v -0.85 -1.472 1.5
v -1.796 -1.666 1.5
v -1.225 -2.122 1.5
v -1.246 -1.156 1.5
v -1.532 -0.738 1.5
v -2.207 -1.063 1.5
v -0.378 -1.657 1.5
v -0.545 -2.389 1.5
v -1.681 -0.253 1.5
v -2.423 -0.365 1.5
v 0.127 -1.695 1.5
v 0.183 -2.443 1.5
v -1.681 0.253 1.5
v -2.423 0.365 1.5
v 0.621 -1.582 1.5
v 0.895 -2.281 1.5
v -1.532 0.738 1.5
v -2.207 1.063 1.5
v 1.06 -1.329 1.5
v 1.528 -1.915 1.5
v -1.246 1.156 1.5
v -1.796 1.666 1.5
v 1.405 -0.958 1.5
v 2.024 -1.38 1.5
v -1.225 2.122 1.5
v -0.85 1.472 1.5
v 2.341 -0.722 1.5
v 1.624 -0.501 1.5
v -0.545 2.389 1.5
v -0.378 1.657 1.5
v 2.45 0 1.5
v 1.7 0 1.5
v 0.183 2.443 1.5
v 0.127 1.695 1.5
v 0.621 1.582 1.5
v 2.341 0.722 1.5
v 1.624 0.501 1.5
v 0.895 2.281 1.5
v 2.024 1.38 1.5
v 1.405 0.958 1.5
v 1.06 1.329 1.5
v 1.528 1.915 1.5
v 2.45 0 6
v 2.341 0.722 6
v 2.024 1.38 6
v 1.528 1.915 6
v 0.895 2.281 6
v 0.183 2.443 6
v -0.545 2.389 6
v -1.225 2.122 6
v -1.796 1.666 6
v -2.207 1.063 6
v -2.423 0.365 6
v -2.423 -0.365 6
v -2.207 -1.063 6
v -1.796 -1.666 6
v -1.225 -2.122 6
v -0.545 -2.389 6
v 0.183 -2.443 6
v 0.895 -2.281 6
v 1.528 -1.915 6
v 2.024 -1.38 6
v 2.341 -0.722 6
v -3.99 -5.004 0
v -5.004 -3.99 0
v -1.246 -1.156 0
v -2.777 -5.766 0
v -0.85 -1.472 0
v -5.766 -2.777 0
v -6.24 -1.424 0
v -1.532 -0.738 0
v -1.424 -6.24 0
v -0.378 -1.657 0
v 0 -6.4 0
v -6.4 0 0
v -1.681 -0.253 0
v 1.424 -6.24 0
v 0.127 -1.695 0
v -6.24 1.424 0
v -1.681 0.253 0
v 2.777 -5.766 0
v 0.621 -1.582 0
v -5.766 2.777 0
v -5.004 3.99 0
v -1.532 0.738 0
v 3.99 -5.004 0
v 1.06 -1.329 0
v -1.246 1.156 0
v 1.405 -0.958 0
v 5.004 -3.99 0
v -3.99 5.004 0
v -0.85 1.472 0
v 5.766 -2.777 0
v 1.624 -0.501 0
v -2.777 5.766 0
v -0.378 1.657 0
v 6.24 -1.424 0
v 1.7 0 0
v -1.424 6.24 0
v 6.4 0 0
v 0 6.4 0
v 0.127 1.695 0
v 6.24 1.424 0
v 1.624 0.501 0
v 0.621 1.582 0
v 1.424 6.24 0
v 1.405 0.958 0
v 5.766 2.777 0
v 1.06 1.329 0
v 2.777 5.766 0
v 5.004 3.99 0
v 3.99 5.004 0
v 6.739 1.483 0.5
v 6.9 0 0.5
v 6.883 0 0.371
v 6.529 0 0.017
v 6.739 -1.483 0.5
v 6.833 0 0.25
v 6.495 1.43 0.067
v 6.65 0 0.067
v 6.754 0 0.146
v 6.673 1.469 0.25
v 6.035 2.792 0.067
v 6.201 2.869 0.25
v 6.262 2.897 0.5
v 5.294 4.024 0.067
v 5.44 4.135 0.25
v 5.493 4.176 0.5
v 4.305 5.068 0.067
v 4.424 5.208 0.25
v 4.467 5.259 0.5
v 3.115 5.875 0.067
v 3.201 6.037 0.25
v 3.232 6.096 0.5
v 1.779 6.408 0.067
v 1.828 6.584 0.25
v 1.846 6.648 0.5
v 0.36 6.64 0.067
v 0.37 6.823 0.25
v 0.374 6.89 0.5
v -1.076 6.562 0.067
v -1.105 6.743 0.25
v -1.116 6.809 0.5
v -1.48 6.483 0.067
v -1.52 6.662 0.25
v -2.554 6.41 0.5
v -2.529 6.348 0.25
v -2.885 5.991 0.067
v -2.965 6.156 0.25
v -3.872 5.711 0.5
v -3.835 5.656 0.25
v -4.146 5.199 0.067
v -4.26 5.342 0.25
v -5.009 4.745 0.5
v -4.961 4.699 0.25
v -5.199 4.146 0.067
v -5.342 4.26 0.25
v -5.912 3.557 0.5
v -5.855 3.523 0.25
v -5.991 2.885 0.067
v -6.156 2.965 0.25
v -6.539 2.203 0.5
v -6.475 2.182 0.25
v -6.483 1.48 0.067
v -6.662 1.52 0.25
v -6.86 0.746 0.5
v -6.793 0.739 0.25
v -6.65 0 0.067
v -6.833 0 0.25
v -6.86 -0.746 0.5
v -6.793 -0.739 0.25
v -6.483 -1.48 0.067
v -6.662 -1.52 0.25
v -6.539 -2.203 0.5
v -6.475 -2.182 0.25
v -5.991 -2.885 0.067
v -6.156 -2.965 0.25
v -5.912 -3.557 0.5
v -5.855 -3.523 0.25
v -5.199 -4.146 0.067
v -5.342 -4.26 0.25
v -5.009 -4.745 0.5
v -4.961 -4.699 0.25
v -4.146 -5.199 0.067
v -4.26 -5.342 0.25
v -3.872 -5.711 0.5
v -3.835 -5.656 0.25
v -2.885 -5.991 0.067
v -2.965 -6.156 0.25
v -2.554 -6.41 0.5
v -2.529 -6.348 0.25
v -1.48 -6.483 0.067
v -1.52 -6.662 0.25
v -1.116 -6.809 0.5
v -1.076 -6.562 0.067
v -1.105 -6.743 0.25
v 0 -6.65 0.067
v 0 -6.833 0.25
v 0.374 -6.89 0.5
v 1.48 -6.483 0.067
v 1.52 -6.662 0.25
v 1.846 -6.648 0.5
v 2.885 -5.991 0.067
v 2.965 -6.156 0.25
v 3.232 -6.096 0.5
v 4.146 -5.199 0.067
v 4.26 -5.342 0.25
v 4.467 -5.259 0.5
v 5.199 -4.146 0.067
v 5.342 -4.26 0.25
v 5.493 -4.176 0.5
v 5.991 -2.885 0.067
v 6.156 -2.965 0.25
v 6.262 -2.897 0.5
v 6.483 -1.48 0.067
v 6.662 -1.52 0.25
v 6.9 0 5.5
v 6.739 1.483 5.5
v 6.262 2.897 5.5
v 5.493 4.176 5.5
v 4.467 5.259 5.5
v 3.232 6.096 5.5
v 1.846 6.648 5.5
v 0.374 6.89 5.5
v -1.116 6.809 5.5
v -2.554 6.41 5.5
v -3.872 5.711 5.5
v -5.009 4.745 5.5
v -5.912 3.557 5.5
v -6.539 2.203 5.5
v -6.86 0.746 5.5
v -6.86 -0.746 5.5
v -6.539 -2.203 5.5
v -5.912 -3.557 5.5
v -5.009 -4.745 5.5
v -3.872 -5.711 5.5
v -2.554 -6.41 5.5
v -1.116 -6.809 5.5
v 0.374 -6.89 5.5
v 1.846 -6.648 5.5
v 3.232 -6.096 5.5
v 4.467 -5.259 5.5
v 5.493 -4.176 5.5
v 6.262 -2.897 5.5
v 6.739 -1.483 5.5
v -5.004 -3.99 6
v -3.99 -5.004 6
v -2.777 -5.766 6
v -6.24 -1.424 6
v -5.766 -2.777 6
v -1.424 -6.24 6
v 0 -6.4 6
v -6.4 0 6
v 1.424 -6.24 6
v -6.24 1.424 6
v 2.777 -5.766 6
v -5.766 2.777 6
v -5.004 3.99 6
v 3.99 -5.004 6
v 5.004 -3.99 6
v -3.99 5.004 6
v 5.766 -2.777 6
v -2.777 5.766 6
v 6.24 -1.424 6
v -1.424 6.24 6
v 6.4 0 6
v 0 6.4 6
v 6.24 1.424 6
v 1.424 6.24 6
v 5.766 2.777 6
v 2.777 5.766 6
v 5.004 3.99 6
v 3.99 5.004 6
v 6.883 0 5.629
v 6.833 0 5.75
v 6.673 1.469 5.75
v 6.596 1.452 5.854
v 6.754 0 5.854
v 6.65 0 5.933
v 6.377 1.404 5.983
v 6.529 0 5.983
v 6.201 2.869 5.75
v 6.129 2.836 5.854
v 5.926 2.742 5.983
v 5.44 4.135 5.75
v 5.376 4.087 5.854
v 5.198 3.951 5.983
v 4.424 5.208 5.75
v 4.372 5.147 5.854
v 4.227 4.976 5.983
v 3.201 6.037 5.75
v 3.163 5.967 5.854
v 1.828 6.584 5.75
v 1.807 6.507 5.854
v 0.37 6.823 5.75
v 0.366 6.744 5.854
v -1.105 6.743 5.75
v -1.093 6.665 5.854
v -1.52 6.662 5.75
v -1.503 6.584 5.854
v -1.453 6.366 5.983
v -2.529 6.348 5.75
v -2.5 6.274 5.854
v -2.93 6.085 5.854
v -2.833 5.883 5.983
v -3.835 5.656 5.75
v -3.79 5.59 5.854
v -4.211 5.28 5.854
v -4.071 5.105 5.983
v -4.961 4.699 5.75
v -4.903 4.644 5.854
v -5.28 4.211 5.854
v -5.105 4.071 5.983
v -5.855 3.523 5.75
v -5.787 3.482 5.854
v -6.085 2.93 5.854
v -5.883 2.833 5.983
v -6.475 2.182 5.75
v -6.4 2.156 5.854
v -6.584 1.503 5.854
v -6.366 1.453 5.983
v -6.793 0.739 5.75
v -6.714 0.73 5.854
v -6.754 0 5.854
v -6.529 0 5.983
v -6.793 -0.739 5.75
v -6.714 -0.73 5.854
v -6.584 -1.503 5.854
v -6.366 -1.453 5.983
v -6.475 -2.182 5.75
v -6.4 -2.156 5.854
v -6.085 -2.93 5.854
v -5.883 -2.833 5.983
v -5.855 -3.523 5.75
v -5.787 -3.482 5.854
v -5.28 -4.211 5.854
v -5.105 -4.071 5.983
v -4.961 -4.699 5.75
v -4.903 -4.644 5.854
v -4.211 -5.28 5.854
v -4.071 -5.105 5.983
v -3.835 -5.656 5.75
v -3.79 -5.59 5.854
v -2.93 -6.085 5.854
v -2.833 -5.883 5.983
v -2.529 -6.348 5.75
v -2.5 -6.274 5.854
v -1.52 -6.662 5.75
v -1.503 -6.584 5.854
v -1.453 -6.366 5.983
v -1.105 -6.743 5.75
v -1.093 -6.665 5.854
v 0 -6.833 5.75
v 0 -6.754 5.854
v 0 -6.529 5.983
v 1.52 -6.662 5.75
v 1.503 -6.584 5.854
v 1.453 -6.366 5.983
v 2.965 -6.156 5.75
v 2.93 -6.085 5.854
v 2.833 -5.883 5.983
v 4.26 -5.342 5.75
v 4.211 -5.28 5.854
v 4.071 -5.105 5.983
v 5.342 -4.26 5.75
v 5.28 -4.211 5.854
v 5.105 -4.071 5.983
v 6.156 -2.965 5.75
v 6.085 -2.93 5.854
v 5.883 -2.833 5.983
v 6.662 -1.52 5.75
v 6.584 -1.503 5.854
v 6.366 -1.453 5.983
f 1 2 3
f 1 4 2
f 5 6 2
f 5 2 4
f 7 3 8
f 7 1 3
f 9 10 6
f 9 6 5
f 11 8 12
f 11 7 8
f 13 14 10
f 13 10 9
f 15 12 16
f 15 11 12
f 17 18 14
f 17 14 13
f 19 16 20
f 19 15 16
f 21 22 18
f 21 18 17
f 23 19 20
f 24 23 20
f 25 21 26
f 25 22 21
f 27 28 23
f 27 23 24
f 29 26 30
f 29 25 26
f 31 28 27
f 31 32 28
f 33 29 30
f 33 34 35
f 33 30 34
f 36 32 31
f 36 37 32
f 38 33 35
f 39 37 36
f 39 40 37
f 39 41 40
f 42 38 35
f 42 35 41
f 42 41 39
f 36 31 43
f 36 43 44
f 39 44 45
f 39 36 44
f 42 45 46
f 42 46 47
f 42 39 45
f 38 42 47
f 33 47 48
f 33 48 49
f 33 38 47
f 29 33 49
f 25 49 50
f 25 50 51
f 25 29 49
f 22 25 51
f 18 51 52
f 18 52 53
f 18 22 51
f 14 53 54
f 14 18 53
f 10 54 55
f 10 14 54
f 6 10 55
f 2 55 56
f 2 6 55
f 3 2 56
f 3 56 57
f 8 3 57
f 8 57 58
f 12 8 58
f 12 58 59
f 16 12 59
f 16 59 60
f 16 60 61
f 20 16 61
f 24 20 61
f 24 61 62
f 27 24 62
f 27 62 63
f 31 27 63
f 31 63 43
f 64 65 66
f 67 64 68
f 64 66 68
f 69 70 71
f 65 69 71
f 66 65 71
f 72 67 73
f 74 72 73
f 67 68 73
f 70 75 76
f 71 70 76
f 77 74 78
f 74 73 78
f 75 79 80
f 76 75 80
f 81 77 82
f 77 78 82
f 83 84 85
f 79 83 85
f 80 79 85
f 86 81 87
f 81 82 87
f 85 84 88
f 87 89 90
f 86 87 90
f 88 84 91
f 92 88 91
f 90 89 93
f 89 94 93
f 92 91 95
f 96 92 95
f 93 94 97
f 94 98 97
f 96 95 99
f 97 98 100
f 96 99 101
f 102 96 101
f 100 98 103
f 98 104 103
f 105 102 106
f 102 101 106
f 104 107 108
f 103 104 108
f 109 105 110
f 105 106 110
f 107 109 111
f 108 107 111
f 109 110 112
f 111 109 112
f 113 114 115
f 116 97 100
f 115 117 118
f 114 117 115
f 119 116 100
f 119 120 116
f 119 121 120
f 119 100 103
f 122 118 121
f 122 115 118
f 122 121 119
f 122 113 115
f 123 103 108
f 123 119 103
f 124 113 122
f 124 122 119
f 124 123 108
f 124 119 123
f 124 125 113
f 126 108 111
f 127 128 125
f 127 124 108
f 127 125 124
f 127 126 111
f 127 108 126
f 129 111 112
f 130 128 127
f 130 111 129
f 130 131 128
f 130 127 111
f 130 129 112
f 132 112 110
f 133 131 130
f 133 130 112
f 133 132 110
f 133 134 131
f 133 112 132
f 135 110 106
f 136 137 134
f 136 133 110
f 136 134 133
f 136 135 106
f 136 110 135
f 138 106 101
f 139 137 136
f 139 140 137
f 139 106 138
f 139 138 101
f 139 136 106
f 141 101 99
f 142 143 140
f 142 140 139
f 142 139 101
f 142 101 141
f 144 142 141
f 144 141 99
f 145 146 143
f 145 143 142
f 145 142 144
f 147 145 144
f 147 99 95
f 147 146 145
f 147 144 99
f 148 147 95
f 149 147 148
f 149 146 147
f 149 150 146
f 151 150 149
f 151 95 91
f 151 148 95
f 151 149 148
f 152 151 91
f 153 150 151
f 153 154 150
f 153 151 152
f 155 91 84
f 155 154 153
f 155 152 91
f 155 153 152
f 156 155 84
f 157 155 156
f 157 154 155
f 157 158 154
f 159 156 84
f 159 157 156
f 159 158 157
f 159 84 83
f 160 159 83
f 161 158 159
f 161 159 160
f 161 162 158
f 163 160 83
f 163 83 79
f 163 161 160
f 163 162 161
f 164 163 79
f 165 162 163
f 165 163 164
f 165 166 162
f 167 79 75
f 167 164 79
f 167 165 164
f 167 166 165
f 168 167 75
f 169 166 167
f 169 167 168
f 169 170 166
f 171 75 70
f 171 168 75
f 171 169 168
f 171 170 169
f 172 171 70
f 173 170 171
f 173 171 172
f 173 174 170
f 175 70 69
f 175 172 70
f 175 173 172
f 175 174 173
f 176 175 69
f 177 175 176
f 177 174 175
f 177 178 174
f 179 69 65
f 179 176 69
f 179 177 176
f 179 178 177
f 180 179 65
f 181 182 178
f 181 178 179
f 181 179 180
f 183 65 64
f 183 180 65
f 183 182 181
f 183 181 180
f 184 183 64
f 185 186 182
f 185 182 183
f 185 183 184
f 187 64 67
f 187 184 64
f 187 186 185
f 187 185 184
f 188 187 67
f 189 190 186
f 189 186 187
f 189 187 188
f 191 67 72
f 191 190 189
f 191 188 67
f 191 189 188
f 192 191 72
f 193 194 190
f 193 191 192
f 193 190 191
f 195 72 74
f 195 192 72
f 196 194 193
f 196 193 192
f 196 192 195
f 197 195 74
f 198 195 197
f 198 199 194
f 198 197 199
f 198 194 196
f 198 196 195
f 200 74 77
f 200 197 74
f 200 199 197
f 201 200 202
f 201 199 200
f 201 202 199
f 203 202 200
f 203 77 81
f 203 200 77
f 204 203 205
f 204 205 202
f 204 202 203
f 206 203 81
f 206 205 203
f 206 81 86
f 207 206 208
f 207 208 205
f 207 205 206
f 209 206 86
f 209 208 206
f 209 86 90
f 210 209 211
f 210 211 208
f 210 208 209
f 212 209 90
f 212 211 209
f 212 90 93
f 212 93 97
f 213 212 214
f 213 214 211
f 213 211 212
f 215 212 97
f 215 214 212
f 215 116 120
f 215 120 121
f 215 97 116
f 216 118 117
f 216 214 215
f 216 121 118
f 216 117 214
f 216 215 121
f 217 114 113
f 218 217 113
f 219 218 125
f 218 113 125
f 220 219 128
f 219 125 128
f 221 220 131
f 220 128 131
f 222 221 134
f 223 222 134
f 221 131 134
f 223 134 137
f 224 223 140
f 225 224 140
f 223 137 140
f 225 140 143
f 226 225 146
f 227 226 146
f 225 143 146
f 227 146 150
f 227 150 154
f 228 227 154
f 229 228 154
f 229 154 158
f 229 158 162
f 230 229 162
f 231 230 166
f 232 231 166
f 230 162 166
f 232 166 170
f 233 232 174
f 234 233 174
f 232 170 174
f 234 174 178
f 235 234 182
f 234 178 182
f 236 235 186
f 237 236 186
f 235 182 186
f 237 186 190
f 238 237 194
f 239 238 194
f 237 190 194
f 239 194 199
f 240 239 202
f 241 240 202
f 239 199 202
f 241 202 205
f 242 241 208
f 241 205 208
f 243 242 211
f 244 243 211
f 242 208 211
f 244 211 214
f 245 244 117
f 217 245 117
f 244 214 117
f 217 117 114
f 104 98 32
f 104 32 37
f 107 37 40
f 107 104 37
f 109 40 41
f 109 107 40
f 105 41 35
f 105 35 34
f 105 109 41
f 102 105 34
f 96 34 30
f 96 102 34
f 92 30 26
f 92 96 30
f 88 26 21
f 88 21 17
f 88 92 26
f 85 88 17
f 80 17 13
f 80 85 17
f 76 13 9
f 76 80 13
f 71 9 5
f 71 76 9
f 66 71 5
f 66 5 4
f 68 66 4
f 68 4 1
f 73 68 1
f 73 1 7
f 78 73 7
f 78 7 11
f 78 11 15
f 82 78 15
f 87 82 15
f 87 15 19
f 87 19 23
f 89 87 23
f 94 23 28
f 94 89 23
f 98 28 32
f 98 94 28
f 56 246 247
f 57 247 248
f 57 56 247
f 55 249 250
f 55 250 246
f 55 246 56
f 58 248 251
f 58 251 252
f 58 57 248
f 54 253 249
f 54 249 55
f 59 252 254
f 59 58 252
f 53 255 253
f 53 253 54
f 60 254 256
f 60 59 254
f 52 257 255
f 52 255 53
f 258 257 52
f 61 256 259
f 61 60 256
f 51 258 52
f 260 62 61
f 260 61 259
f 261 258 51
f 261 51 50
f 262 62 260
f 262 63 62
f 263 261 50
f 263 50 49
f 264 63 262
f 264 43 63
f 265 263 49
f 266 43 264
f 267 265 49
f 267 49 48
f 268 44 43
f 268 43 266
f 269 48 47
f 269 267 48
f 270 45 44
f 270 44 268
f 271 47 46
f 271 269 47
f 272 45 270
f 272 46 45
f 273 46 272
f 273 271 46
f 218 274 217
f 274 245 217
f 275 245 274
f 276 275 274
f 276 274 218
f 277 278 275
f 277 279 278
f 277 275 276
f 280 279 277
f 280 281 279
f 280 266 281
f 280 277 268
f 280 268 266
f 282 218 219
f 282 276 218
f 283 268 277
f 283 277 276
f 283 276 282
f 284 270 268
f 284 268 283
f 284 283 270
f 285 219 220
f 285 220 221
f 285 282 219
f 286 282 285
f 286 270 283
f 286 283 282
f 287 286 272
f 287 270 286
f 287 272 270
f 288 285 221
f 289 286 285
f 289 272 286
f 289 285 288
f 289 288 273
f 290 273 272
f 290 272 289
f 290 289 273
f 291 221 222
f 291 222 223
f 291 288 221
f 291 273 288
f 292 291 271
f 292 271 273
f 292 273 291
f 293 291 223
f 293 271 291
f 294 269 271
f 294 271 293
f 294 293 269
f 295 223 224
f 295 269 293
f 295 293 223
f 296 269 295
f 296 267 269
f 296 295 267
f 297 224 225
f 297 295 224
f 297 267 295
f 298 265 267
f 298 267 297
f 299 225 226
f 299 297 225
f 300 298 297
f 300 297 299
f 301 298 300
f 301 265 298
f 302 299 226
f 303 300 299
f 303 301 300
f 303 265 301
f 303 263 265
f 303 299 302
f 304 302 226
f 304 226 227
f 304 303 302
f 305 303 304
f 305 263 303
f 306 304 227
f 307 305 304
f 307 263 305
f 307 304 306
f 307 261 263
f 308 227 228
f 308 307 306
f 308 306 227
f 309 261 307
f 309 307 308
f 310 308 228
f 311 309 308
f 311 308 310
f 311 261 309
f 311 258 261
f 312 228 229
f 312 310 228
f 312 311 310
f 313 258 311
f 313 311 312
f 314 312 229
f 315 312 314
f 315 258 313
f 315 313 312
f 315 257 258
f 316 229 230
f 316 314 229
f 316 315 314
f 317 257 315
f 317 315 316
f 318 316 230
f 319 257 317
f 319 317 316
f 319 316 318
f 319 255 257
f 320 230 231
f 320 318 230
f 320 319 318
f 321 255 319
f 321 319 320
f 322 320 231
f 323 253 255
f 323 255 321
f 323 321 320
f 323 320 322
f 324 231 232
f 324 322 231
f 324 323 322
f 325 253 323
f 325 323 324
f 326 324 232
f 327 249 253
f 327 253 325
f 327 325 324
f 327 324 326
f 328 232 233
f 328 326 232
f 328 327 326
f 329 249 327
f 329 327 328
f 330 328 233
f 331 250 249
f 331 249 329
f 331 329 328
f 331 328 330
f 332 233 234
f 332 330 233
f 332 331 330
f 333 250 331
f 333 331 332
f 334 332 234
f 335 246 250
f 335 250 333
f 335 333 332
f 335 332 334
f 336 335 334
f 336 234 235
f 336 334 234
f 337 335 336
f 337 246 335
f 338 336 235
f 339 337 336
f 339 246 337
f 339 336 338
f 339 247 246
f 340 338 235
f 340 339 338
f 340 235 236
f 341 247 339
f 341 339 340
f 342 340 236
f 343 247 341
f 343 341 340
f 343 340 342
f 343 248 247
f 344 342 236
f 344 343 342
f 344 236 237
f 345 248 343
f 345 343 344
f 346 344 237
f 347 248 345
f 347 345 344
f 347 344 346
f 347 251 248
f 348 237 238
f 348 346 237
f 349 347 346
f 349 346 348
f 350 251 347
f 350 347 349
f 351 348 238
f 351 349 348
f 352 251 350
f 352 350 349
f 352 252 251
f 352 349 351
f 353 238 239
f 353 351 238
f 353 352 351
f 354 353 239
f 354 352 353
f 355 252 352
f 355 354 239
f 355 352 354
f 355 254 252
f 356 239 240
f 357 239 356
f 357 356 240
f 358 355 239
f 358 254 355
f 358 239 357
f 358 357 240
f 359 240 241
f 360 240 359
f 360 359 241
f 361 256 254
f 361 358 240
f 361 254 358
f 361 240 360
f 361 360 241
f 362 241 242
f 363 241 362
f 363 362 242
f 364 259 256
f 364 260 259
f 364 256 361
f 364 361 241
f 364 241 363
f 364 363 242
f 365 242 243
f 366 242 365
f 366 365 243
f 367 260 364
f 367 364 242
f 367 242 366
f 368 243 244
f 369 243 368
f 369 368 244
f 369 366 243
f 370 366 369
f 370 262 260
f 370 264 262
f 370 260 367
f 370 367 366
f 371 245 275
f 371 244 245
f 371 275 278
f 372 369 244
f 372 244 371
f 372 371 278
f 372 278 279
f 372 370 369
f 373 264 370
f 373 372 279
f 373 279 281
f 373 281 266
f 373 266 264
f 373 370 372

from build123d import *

# Parameters (mm, degrees)
F0_R     = 6.9
F0_R_2   = 2.45
F1_DEPTH = 6
F0_R_3   = 1.7
F2_DEPTH = 1.5
F3_R     = 0.5


with BuildPart() as f1:
    # F0 (on Top) → F1 (new body)
    with BuildSketch(Plane.XY):
        Circle(F0_R)
        Circle(F0_R_2, mode=Mode.SUBTRACT)
    extrude(amount=F1_DEPTH)

    # F0 (on Top) → F2 (join)
    with BuildSketch(Plane.XY):
        Circle(F0_R_2)
        Circle(F0_R_3, mode=Mode.SUBTRACT)
    extrude(amount=F2_DEPTH)

    # F3
    f3_edges = [f1.edges().sort_by_distance(p)[0] for p in [
        (-6.9, 0, 6),
        (-6.9, 0, 0),
    ]]
    fillet(f3_edges, radius=F3_R)


solid = f1.part
